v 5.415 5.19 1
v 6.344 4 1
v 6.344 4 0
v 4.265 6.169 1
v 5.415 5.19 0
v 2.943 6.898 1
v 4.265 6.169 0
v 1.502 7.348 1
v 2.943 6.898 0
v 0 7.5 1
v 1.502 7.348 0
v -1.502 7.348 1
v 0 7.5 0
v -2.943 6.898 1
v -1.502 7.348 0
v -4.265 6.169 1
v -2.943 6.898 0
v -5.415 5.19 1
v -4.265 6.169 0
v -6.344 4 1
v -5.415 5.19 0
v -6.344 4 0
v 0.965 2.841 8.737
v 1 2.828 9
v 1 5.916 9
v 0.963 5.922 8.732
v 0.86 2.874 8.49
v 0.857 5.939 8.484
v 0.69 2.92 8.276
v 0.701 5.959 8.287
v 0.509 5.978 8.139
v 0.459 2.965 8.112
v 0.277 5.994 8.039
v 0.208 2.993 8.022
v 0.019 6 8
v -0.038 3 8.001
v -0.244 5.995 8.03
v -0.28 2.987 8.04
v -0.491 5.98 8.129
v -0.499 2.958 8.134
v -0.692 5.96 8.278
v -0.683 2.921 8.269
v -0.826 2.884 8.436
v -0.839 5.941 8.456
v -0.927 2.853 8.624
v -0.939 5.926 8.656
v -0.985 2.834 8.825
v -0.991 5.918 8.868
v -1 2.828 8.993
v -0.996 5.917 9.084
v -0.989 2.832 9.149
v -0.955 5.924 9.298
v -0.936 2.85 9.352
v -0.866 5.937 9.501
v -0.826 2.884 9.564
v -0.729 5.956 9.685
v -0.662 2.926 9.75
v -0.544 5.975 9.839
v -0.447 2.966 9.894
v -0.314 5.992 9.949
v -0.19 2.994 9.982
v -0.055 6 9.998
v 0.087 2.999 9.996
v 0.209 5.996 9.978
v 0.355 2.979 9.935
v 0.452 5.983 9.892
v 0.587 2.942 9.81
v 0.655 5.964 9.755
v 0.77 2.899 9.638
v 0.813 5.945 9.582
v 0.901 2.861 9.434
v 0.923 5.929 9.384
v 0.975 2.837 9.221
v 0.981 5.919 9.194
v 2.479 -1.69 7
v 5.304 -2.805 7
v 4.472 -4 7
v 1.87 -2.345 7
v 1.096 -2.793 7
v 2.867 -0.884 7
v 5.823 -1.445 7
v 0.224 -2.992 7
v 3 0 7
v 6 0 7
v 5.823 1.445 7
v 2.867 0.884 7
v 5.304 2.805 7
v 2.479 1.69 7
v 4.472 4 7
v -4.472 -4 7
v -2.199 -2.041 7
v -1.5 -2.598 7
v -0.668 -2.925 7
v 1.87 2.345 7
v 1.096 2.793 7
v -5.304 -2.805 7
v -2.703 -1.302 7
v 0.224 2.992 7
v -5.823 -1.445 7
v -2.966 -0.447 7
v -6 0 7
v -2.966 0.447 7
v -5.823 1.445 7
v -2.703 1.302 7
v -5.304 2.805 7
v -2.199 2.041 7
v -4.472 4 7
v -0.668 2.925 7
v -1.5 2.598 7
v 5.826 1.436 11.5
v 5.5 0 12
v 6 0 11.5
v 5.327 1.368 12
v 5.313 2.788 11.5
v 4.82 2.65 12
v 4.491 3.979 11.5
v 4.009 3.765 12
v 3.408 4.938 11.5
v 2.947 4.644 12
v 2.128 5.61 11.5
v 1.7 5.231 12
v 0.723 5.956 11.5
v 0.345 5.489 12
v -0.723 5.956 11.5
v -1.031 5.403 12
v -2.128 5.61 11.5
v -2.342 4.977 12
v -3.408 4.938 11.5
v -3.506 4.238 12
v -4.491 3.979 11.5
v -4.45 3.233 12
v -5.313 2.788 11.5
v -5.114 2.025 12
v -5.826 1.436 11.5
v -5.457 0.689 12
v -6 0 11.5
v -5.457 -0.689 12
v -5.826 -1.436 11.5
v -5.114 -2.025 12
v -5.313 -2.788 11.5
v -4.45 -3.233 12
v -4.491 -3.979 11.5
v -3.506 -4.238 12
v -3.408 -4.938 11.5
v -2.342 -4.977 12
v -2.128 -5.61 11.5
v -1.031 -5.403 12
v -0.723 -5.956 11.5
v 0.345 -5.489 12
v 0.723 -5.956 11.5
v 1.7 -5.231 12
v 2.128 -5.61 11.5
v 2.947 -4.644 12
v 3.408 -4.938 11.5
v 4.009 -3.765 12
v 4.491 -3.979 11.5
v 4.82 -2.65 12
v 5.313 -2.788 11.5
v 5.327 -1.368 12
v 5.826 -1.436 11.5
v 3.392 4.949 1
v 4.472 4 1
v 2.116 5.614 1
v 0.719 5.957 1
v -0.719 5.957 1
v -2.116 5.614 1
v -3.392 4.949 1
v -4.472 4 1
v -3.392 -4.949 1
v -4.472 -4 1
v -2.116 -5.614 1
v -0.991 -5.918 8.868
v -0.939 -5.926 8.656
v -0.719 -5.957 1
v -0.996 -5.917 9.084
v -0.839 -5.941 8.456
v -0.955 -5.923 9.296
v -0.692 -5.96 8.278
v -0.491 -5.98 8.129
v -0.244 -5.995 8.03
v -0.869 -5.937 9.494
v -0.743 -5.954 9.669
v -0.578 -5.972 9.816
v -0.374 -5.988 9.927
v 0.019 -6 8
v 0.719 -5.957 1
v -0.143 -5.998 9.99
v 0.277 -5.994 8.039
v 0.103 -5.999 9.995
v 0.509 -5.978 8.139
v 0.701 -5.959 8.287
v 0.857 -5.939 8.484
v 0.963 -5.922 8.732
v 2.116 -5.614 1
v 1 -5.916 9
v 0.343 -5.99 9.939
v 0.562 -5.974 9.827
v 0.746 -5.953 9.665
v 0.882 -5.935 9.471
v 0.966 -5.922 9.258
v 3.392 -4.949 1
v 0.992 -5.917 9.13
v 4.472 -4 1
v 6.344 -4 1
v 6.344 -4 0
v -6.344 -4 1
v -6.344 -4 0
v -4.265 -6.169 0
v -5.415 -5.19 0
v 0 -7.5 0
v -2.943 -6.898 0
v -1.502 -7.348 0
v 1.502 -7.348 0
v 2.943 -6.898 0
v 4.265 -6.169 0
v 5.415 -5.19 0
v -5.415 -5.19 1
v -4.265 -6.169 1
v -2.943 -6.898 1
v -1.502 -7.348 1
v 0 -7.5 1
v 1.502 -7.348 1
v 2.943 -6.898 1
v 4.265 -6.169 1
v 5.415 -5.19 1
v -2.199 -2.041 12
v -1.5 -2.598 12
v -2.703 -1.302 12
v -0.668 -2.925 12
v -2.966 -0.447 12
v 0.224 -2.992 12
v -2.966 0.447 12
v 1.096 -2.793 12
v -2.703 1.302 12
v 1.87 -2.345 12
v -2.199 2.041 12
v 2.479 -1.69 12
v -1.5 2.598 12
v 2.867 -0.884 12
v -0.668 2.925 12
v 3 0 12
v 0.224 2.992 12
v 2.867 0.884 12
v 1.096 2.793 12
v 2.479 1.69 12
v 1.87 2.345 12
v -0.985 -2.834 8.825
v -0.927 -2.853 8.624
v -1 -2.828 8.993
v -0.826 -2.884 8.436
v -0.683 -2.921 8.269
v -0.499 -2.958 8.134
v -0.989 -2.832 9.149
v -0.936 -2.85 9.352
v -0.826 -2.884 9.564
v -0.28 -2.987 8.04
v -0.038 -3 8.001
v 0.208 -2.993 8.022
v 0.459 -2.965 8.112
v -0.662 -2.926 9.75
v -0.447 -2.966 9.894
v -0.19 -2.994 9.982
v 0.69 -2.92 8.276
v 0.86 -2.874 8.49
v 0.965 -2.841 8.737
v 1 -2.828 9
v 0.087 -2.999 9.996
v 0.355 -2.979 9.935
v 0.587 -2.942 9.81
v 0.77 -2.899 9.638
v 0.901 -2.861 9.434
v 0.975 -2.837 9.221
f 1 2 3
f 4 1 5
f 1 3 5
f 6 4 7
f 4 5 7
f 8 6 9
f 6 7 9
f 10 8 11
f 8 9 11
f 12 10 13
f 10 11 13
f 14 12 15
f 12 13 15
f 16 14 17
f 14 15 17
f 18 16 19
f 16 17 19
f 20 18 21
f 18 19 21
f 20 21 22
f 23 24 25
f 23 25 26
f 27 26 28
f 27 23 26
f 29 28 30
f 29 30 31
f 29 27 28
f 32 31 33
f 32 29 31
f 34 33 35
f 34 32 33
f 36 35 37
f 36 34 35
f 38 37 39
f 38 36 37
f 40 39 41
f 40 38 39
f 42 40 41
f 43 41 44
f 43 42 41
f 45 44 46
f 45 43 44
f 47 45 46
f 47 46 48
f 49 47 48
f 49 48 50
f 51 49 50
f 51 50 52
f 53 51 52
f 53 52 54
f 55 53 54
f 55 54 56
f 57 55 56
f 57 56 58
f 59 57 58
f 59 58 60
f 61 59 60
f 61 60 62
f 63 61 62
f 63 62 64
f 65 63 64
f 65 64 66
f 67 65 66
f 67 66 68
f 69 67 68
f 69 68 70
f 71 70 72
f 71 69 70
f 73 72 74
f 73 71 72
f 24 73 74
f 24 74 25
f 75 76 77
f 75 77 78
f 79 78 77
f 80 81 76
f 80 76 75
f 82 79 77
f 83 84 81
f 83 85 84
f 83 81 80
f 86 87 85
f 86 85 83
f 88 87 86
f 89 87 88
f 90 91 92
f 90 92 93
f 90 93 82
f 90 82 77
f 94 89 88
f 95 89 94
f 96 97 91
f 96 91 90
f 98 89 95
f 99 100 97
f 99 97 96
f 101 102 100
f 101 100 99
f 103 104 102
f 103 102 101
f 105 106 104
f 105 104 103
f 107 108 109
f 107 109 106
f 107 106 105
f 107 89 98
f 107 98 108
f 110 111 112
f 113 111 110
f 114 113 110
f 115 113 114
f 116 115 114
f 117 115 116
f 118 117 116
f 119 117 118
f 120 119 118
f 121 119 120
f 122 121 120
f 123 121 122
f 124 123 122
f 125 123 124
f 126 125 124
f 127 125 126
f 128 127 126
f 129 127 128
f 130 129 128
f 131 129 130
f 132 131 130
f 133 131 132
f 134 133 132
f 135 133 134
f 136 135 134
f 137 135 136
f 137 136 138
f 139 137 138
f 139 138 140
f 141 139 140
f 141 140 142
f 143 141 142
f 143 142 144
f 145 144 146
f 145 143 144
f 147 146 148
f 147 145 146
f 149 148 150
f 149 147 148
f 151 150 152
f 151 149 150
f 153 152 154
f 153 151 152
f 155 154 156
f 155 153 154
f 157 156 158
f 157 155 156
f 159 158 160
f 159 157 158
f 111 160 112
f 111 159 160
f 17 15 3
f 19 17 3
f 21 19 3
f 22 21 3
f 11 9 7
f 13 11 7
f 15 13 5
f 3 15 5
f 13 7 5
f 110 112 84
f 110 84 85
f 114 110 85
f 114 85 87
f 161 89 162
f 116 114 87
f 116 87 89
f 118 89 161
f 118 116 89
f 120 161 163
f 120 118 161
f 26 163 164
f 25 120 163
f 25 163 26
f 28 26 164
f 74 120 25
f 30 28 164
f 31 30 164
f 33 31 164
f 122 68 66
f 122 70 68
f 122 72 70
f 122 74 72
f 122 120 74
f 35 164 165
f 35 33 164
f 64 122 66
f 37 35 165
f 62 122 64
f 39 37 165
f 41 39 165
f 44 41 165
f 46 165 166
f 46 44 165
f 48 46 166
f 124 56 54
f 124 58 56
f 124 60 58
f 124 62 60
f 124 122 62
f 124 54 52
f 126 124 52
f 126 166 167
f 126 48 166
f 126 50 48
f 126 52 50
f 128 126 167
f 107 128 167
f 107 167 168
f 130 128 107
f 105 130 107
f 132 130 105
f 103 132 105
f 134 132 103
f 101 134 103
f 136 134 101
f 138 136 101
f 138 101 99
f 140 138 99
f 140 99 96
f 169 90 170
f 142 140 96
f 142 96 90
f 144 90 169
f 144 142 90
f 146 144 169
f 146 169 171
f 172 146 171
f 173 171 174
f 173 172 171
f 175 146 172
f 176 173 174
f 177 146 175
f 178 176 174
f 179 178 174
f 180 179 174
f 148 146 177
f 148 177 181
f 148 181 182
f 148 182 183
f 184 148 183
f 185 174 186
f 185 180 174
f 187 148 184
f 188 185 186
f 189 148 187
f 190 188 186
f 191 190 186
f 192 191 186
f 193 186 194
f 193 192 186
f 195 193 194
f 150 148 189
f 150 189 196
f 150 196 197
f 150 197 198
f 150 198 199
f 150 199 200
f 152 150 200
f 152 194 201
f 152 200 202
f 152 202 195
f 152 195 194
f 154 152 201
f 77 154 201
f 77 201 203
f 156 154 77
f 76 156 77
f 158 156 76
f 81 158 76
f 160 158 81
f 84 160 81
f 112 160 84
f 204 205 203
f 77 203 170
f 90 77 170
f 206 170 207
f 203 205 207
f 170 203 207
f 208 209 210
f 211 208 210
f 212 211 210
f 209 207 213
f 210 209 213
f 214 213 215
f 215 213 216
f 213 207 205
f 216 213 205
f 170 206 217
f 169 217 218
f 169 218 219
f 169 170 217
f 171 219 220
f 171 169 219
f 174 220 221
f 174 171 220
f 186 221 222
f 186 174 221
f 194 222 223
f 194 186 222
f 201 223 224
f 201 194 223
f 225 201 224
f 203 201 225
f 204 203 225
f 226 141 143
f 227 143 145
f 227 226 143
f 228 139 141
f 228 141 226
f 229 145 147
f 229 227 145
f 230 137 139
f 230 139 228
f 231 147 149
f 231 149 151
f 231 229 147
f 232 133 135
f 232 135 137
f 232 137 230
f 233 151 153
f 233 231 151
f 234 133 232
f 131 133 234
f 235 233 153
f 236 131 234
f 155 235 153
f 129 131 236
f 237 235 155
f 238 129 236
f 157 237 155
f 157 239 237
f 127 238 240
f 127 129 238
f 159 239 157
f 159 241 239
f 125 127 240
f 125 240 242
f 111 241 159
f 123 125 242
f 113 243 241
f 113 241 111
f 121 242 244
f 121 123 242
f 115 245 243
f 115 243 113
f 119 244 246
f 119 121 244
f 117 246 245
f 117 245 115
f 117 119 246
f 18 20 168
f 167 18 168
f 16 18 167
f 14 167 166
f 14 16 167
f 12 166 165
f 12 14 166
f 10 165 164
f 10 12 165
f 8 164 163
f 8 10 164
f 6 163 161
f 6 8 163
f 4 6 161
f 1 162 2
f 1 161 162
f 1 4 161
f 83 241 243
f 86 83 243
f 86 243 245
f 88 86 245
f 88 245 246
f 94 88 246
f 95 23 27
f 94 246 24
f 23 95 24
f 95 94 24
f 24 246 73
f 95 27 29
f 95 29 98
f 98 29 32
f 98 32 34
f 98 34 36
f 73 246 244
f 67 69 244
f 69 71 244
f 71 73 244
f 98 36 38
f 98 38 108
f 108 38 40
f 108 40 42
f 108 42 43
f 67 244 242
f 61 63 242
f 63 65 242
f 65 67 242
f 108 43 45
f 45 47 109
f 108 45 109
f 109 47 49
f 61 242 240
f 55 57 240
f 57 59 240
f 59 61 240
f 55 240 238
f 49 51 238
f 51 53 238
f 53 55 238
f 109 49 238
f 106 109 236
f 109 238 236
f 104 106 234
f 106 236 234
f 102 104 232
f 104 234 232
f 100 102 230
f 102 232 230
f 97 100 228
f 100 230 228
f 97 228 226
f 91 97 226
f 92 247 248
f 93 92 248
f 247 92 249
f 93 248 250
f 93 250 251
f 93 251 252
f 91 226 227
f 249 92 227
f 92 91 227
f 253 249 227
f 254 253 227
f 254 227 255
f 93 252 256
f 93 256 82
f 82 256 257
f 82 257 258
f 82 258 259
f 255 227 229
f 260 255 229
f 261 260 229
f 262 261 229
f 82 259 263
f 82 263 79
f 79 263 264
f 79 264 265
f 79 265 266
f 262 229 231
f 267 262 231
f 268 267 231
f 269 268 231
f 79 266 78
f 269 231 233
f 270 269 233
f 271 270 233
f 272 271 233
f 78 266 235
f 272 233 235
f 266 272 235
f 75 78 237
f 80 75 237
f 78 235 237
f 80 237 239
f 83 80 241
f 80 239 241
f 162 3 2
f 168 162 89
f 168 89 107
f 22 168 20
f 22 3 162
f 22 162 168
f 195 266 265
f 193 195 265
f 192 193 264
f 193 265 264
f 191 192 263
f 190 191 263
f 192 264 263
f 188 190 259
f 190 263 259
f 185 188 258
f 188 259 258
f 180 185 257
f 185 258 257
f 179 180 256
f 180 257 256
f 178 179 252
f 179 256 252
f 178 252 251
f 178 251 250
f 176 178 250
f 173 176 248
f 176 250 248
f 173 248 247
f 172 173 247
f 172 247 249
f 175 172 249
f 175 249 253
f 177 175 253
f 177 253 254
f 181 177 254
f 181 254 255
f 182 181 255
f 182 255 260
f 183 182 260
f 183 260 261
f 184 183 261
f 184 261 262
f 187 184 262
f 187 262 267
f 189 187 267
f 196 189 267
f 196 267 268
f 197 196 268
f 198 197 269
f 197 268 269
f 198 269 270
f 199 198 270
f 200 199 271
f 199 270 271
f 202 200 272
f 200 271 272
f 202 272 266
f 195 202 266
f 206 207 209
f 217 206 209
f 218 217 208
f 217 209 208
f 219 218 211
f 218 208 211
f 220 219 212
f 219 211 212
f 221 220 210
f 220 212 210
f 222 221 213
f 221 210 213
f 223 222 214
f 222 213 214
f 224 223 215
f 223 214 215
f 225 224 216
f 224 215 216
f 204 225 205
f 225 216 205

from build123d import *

# Parameters (mm, degrees)
ESQUISSE1_R                  = 7.5
BOSS_EXTRU_1_DEPTH           = 12
ESQUISSE2_R                  = 7.5
ESQUISSE2_R_2                = 6
ENL_V_MAT_EXTRU_1_DEPTH      = 11
ESQUISSE3_R                  = 3
ENL_V_MAT_EXTRU_2_DEPTH      = 5
ESQUISSE4_W                  = 19.769622122
ESQUISSE4_H                  = 8
ENL_V_MAT_EXTRU_3_DEPTH      = 7
ESQUISSE5_R                  = 1
ENL_V_MAT_EXTRU_4_DEPTH      = 7
ENL_V_MAT_EXTRU_4_DEPTH_BACK = 7
CHANFREIN1_SIZE              = 0.5


with BuildPart() as part:
    # Esquisse1 → Boss.-Extru.1 (new body)
    with BuildSketch(Plane.XY):
        Circle(ESQUISSE1_R)
    extrude(amount=BOSS_EXTRU_1_DEPTH)

    # Esquisse2 → Enlèv. mat.-Extru.1 (cut)
    with BuildSketch(Plane.XY.offset(12)):
        Circle(ESQUISSE2_R)
        Circle(ESQUISSE2_R_2, mode=Mode.SUBTRACT)
    extrude(amount=-ENL_V_MAT_EXTRU_1_DEPTH, mode=Mode.SUBTRACT)

    # Esquisse3 → Enlèv. mat.-Extru.2 (cut)
    with BuildSketch(Plane.XY.offset(12)):
        Circle(ESQUISSE3_R)
    extrude(amount=-ENL_V_MAT_EXTRU_2_DEPTH, mode=Mode.SUBTRACT)

    # Esquisse4 → Enlèv. mat.-Extru.3 (cut)
    with BuildSketch(Plane(origin=(0, 0, 0), x_dir=(-1, 0, 0), z_dir=(0, 0, -1))):
        Rectangle(ESQUISSE4_W, ESQUISSE4_H)
    extrude(amount=-ENL_V_MAT_EXTRU_3_DEPTH, mode=Mode.SUBTRACT)

    # Esquisse5 → Enlèv. mat.-Extru.4 (cut, two sides)
    with BuildSketch(Plane(origin=(0, 0, 0), x_dir=(1, 0, 0), z_dir=(0, 1, 0))) as enl_v_mat_extru_4_sk:
        with Locations((0, -9)):
            Circle(ESQUISSE5_R)
    extrude(amount=ENL_V_MAT_EXTRU_4_DEPTH, mode=Mode.SUBTRACT)
    extrude(enl_v_mat_extru_4_sk.sketch, amount=-ENL_V_MAT_EXTRU_4_DEPTH_BACK, mode=Mode.SUBTRACT)

    # Chanfrein1
    chanfrein1_edges = [part.edges().sort_by_distance(p)[0] for p in [
        (-6, 0, 12),
    ]]
    chamfer(chanfrein1_edges, length=CHANFREIN1_SIZE)


solid = part.part
